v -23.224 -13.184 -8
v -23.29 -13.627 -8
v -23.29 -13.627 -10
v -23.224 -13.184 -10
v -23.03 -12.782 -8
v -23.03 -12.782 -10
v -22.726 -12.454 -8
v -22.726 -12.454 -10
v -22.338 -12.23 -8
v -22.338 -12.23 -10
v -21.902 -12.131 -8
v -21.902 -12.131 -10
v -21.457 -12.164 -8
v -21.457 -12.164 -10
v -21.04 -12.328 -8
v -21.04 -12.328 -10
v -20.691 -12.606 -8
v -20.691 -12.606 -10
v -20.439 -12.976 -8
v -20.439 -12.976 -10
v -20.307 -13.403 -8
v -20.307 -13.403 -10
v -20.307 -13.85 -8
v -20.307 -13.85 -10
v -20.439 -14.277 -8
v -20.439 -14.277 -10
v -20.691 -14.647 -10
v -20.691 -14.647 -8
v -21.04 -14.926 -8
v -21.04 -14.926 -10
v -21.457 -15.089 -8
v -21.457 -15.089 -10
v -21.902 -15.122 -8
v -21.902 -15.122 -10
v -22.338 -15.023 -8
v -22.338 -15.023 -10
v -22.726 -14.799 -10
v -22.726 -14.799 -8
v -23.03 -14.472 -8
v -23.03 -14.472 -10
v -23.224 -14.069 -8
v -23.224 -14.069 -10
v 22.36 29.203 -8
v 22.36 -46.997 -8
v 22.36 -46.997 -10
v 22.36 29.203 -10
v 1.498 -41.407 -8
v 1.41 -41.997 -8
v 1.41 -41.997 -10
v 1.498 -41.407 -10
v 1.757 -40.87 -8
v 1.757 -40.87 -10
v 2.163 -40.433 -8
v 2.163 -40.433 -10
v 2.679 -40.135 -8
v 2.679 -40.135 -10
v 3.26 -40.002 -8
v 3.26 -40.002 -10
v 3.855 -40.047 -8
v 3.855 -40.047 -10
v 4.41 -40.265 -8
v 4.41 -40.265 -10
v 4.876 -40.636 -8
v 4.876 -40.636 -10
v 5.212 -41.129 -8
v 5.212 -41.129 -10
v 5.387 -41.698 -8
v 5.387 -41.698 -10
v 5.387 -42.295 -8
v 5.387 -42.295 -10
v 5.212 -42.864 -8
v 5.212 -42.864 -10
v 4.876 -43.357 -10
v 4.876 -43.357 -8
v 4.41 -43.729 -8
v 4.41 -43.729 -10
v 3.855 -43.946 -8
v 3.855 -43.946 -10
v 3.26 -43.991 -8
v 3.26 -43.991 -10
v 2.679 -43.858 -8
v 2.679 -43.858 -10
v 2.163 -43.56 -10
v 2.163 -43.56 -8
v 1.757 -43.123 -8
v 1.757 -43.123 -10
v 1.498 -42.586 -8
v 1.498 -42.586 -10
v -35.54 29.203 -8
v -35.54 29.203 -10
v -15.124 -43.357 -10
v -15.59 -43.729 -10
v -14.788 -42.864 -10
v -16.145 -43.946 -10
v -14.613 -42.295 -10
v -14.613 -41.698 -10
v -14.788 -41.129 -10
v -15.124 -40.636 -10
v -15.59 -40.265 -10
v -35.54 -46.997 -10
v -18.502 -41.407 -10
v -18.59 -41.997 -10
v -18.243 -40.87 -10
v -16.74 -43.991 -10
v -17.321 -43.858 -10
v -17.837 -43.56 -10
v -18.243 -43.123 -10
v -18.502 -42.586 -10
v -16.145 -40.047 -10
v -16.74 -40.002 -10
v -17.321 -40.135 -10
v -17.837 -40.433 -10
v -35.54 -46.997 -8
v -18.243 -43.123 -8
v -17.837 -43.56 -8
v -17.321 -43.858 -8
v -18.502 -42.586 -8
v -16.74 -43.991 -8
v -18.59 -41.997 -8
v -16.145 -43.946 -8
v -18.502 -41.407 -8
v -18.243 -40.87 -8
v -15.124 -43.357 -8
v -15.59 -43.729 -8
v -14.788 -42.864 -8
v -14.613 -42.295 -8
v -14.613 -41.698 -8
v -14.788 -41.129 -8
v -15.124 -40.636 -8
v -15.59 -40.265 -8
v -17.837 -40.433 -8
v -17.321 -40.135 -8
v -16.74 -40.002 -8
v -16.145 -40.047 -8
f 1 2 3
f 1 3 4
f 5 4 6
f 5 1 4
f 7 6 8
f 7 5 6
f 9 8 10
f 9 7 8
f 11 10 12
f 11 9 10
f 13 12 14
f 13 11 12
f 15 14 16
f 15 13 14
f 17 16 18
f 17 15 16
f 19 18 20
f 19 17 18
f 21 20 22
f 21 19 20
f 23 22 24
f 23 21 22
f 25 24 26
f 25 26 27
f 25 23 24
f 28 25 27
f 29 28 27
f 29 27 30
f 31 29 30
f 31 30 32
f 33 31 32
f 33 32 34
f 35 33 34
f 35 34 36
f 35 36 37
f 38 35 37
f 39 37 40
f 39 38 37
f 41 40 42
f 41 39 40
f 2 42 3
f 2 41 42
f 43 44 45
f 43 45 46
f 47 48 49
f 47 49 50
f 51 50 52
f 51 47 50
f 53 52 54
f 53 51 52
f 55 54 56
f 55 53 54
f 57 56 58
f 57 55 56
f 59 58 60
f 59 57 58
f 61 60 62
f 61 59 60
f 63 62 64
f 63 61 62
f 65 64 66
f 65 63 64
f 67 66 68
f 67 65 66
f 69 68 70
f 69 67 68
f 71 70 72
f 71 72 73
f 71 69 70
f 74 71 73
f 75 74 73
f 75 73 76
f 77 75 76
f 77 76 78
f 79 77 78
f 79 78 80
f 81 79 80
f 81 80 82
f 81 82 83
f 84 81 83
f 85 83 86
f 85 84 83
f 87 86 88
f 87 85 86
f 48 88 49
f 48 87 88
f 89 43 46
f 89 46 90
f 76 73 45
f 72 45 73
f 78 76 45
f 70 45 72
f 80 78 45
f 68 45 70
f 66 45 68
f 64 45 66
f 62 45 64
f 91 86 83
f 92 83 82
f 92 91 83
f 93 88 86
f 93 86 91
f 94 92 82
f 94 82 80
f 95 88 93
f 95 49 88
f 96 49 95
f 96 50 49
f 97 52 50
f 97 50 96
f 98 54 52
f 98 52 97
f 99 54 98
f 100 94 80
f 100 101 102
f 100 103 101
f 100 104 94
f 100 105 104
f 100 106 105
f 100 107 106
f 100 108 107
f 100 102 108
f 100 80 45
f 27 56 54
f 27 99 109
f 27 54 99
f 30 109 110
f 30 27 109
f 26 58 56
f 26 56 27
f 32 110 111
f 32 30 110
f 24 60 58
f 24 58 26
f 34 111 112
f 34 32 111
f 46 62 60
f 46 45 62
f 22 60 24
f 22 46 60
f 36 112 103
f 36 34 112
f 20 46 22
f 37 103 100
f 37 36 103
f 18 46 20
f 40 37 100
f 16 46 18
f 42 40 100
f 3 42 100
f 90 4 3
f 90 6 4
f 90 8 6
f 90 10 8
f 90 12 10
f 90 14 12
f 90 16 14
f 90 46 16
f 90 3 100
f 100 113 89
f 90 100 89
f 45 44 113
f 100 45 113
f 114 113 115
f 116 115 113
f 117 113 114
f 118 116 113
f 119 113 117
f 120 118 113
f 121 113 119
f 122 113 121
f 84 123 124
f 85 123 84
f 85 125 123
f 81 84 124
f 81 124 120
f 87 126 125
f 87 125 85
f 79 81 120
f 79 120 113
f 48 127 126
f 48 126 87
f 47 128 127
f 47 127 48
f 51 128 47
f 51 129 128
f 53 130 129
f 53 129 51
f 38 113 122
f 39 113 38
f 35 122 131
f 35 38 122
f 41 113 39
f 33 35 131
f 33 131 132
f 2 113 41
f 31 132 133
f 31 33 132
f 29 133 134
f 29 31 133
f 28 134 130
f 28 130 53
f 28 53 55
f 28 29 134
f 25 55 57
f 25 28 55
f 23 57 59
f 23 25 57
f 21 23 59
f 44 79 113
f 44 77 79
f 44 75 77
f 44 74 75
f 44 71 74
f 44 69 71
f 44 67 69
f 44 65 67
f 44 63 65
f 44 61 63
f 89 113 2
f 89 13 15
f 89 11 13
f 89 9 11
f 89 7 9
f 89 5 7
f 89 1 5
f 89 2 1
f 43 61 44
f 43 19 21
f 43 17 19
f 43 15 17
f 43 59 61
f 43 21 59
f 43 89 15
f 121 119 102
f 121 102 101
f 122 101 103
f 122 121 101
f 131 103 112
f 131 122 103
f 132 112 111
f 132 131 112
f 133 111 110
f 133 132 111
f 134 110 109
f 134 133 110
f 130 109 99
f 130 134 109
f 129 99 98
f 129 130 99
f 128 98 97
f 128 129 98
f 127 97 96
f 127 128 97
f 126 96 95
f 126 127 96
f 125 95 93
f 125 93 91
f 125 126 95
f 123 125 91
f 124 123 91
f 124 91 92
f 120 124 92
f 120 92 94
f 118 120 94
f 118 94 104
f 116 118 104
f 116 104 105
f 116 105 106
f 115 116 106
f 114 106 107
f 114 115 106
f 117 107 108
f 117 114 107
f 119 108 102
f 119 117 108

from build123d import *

# Parameters (mm, degrees)
SKETCH1_W           = 57.9
SKETCH1_H           = 76.2
BOSS_EXTRUDE1_DEPTH = 2
SKETCH2_R           = 2
SKETCH2_W           = 12
SKETCH2_H           = 10
SKETCH2_R_2         = 1.5
CUT_EXTRUDE1_DEPTH  = 2
SKETCH4_R           = 2
SKETCH4_R_2         = 1.5
SKETCH4_R_3         = 1.957178151
BOSS_EXTRUDE5_DEPTH = 2
SKETCH8_W           = 57.9
SKETCH8_H           = 76.2
SKETCH8_R           = 2
SKETCH8_R_2         = 1.5
SKETCH8_W_2         = 12
SKETCH8_H_2         = 10
BOSS_EXTRUDE6_DEPTH = 10
SKETCH9_R           = 2
CUT_EXTRUDE6_DEPTH  = 10
SKETCH10_W          = 57.9
SKETCH10_H          = 76.2
CUT_EXTRUDE7_DEPTH  = 10
SKETCH11_W          = 45.093614326
SKETCH11_H          = 27.476395826
BOSS_EXTRUDE7_DEPTH = 2


with BuildPart() as part:
    # Sketch1 → Boss-Extrude1 (new body)
    with BuildSketch(Plane.XY):
        with Locations((-6.590392234, -8.896581688)):
            Rectangle(SKETCH1_W, SKETCH1_H)
    extrude(amount=BOSS_EXTRUDE1_DEPTH)

    # Sketch2 → Cut-Extrude1 (cut)
    with BuildSketch(Plane(origin=(0, 0, 0), x_dir=(-1, 0, 0), z_dir=(0, 0, -1))):
        with Locations((-6.409607766, 14.203418312)):
            Circle(SKETCH2_R)
        with Locations((19.590392234, 14.203418312)):
            Circle(SKETCH2_R)
        with Locations((2.640392234, 4.203418312)):
            Rectangle(SKETCH2_W, SKETCH2_H)
        with Locations((16.590392234, -41.996581688)):
            Circle(SKETCH2_R)
        with Locations((-3.409607766, -41.996581688)):
            Circle(SKETCH2_R)
        with Locations((21.790392234, -13.626581688)):
            Circle(SKETCH2_R_2)
    extrude(amount=-CUT_EXTRUDE1_DEPTH, mode=Mode.SUBTRACT)

    # Sketch4 → Boss-Extrude5 (add)
    # profile 1 of 3: a face of its own
    with BuildSketch(Plane(origin=(0, 0, 0), x_dir=(-1, 0, 0), z_dir=(0, 0, -1))):
        Polygon((35.540392234, 29.203418312), (6.590392234, 29.203418312), (-22.359607766, 29.203418312), (-22.359607766, -46.996581688), (35.540392234, -46.996581688), align=None)
        with Locations((-3.409607766, -41.996581688)):
            Circle(SKETCH4_R, mode=Mode.SUBTRACT)
        with Locations((16.590392234, -41.996581688)):
            Circle(SKETCH4_R, mode=Mode.SUBTRACT)
        with Locations((21.790392234, -13.626581688)):
            Circle(SKETCH4_R_2, mode=Mode.SUBTRACT)
        Polygon((-13.650237399, 24.487372027), (6.590392234, 24.487372027), (30.150370064, 24.487372027), (30.150370064, 9.203418312), (8.640392234, 9.203418312), (8.640392234, -0.796581688), (-3.359607766, -0.796581688), (-3.359607766, 9.203418312), (-13.650237399, 9.203418312), align=None, mode=Mode.SUBTRACT)
    # profile 2 of 3: a face of its own
    with BuildSketch(Plane(origin=(0, 0, 0), x_dir=(-1, 0, 0), z_dir=(0, 0, -1))):
        with Locations((-6.409607766, 14.203418312)):
            Circle(SKETCH4_R)
    # profile 3 of 3: a face of its own
    with BuildSketch(Plane(origin=(0, 0, 0), x_dir=(-1, 0, 0), z_dir=(0, 0, -1))):
        with Locations((19.590392234, 14.203418312)):
            Circle(SKETCH4_R_3)
    extrude(amount=-BOSS_EXTRUDE5_DEPTH)


with BuildPart() as boss_extrude5_piece_1:
    # of the separate pieces the step leaves, piece 1, a body of its own (boss_extrude5_pieces)
    add(part.part.solids().sort_by_distance((-35.540392234, 29.203418312, 0))[0])



with BuildPart() as boss_extrude5_piece_2:
    # of the separate pieces the step leaves, piece 2, a body of its own (boss_extrude5_pieces)
    add(part.part.solids().sort_by_distance((-21.547570385, 14.203418312, 0))[0])


with BuildPart() as boss_extrude5_piece_1_1:
    add(boss_extrude5_piece_1.part)

    add(boss_extrude5_piece_2.part)  # Boss-Extrude6 merges Boss-Extrude5 piece 2
    # Sketch8 → Boss-Extrude6 (add)
    # profile 1 of 2: a face of its own
    with BuildSketch(Plane(origin=(0, 0, 0), x_dir=(-1, 0, 0), z_dir=(0, 0, -1))):
        with Locations((6.590392234, -8.896581688)):
            Rectangle(SKETCH8_W, SKETCH8_H)
        with Locations((16.590392234, -41.996581688)):
            Circle(SKETCH8_R, mode=Mode.SUBTRACT)
        with Locations((21.790392234, -13.626581688)):
            Circle(SKETCH8_R_2, mode=Mode.SUBTRACT)
        with Locations((19.590392234, 14.203418312)):
            Circle(SKETCH8_R, mode=Mode.SUBTRACT)
        with Locations((-3.409607766, -41.996581688)):
            Circle(SKETCH8_R, mode=Mode.SUBTRACT)
        with Locations((2.640392234, 4.203418312)):
            Rectangle(SKETCH8_W_2, SKETCH8_H_2, mode=Mode.SUBTRACT)
    # profile 2 of 2: a face of its own
    with BuildSketch(Plane(origin=(0, 0, 0), x_dir=(-1, 0, 0), z_dir=(0, 0, -1))):
        with Locations((19.590392234, 14.203418312)):
            Circle(SKETCH8_R)
    extrude(amount=BOSS_EXTRUDE6_DEPTH)

    # Sketch9 → Cut-Extrude6 (cut)
    with BuildSketch(Plane(origin=(0, 0, -10), x_dir=(-1, 0, 0), z_dir=(0, 0, -1))):
        with Locations((-6.468155069, 18.203418312)):
            Circle(SKETCH9_R)
        with Locations((19.531844931, 18.203418312)):
            Circle(SKETCH9_R)
    extrude(amount=-CUT_EXTRUDE6_DEPTH, mode=Mode.SUBTRACT)

    # Sketch10 → Cut-Extrude7 (cut)
    with BuildSketch(Plane.XY.offset(2)):
        with Locations((-6.590392234, -8.896581688)):
            Rectangle(SKETCH10_W, SKETCH10_H)
    extrude(amount=-CUT_EXTRUDE7_DEPTH, mode=Mode.SUBTRACT)

    # Sketch11 → Boss-Extrude7 (add)
    with BuildSketch(Plane.XY.offset(-8)):
        with Locations((-7.118685328, 9.132915536)):
            Rectangle(SKETCH11_W, SKETCH11_H)
    extrude(amount=-BOSS_EXTRUDE7_DEPTH)


solid = boss_extrude5_piece_1_1.part
